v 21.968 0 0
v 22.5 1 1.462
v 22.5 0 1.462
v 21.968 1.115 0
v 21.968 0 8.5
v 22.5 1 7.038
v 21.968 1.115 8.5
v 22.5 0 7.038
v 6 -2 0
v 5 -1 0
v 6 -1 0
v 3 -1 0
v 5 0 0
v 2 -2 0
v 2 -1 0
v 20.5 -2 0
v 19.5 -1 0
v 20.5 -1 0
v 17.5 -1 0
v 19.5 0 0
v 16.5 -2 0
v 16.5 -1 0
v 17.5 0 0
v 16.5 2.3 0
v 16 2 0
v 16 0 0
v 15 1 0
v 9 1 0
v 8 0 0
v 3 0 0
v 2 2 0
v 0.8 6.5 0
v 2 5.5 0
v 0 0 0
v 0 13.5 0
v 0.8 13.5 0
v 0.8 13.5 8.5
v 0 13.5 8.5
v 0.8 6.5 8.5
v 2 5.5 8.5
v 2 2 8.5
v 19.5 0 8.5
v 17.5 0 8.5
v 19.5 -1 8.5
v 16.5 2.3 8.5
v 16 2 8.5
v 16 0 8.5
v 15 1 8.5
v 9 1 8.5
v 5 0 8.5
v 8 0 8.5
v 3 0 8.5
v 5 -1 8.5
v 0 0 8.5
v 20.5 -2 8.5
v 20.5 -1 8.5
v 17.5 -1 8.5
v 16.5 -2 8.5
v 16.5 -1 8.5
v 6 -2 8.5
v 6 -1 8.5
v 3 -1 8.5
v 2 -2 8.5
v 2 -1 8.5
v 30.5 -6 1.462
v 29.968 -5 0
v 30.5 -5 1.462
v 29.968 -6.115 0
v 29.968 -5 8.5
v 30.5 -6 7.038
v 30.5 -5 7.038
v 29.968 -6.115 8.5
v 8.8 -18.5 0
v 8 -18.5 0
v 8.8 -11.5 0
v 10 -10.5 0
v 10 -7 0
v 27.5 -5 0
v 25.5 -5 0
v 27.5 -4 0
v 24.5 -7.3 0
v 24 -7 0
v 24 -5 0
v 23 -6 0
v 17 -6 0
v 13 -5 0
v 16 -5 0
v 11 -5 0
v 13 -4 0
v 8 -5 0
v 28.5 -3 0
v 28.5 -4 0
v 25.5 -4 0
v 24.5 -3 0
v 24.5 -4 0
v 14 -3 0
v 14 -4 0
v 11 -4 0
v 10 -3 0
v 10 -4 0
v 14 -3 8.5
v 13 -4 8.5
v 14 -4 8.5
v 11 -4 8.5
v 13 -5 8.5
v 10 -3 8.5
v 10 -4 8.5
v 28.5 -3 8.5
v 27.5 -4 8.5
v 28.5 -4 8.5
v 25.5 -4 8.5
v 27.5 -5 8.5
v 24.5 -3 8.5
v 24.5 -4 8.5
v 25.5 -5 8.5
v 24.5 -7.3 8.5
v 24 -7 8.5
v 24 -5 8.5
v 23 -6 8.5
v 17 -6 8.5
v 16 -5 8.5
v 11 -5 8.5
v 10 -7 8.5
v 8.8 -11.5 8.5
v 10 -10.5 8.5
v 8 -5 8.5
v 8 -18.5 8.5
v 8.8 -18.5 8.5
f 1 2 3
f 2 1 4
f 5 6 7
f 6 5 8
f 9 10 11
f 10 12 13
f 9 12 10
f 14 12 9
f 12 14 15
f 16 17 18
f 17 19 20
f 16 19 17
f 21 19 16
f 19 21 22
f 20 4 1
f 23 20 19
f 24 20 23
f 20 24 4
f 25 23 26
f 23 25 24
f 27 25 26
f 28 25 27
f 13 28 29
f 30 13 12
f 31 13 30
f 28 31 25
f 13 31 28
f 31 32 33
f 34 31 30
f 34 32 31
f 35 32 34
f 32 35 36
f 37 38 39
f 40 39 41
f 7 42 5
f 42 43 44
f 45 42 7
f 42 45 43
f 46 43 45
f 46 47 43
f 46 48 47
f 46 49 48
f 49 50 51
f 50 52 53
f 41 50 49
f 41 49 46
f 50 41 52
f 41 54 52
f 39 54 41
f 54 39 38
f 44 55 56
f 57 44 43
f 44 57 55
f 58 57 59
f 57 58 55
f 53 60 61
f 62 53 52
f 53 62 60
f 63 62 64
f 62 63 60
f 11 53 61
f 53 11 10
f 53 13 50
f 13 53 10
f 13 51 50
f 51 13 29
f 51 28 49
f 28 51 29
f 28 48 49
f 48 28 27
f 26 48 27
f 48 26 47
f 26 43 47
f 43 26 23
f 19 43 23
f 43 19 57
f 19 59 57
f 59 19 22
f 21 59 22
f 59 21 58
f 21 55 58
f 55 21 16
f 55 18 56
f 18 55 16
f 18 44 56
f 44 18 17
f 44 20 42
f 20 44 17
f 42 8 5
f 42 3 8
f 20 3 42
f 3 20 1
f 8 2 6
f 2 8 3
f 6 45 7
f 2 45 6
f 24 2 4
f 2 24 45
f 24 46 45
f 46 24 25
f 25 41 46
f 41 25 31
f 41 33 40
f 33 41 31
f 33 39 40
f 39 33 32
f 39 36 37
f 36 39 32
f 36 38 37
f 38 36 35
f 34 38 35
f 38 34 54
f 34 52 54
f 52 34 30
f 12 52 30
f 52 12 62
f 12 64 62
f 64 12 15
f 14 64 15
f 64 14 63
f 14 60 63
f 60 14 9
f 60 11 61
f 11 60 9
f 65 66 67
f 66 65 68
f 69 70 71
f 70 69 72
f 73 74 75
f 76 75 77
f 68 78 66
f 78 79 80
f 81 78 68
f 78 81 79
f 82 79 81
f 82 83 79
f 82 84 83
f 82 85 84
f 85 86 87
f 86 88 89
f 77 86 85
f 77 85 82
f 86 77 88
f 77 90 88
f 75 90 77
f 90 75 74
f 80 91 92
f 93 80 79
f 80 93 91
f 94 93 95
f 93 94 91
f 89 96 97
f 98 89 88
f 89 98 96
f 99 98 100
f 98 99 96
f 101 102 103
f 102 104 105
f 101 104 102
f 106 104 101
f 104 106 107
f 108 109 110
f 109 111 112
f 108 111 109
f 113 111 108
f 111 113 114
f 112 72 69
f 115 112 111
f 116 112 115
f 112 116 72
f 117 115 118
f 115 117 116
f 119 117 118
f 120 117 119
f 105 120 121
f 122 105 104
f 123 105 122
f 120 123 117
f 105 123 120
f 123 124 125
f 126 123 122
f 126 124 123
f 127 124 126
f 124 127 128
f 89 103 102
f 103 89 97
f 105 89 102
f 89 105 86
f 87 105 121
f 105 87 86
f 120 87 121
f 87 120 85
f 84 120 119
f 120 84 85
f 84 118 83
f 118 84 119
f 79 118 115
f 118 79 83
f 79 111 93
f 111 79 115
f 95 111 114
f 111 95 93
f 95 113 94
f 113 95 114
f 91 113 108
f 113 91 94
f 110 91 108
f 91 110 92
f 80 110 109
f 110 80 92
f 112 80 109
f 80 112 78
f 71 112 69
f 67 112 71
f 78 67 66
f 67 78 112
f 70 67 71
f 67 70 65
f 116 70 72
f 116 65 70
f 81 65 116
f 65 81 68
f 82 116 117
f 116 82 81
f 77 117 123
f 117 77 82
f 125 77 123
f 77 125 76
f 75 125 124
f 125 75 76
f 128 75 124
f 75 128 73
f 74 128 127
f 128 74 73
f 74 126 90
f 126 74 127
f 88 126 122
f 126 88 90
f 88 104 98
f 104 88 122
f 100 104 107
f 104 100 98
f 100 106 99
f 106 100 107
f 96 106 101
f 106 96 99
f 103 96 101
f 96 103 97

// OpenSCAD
// VAIO N Series port replicator connector bumpers
// Copyright François Revol, 2025

// For:
//
// PCGA-PR5
// PCGA-UPR5

module VAIO_N_port_rep_conn_bumper() {
    h = 8.5;
    points = [
        [0, 0],
        [0, 13.5],
        [0.8, 13.5],
        [0.8, 13.5-7],
        [2, 5.5],
        [2, 2],
        [16, 2],
        [16.5, 2.3],
        [22.5, 1],
        [22.5, 0],
        [22.5-3, 0],
        [22.5-3, -1],
        [22.5-2, -1],
        [22.5-2, -2],
        [22.5-2-4, -2],
        [22.5-2-4, -1],
        [22.5-1-4, -1],
        [22.5-1-4, 0],
        [22.5-1-4, 0],
        [22.5-6.5, 0],
        [22.5-7.5, 1],
        [9, 1],
        [8, 0],
        [5, 0],
        [8-3, -1],
        [8-2, -1],
        [8-2, -2],
        [8-2-4, -2],
        [8-2-4, -1],
        [8-1-4, -1],
        [8-1-4, 0],
        [8-1-4, 0],
        [0, 0],
    
    ];
    difference() {
        linear_extrude(h)
            polygon(points);
        for (dh = [0,1])
            translate([22.5, 0, dh*h])
                rotate([0,-(2*dh-1)*20,0])
                    cube([1,5,10], center=true);
    };
}


VAIO_N_port_rep_conn_bumper();
// the other side
translate([8, -5, 0]) mirror([0,1,0]) VAIO_N_port_rep_conn_bumper();
